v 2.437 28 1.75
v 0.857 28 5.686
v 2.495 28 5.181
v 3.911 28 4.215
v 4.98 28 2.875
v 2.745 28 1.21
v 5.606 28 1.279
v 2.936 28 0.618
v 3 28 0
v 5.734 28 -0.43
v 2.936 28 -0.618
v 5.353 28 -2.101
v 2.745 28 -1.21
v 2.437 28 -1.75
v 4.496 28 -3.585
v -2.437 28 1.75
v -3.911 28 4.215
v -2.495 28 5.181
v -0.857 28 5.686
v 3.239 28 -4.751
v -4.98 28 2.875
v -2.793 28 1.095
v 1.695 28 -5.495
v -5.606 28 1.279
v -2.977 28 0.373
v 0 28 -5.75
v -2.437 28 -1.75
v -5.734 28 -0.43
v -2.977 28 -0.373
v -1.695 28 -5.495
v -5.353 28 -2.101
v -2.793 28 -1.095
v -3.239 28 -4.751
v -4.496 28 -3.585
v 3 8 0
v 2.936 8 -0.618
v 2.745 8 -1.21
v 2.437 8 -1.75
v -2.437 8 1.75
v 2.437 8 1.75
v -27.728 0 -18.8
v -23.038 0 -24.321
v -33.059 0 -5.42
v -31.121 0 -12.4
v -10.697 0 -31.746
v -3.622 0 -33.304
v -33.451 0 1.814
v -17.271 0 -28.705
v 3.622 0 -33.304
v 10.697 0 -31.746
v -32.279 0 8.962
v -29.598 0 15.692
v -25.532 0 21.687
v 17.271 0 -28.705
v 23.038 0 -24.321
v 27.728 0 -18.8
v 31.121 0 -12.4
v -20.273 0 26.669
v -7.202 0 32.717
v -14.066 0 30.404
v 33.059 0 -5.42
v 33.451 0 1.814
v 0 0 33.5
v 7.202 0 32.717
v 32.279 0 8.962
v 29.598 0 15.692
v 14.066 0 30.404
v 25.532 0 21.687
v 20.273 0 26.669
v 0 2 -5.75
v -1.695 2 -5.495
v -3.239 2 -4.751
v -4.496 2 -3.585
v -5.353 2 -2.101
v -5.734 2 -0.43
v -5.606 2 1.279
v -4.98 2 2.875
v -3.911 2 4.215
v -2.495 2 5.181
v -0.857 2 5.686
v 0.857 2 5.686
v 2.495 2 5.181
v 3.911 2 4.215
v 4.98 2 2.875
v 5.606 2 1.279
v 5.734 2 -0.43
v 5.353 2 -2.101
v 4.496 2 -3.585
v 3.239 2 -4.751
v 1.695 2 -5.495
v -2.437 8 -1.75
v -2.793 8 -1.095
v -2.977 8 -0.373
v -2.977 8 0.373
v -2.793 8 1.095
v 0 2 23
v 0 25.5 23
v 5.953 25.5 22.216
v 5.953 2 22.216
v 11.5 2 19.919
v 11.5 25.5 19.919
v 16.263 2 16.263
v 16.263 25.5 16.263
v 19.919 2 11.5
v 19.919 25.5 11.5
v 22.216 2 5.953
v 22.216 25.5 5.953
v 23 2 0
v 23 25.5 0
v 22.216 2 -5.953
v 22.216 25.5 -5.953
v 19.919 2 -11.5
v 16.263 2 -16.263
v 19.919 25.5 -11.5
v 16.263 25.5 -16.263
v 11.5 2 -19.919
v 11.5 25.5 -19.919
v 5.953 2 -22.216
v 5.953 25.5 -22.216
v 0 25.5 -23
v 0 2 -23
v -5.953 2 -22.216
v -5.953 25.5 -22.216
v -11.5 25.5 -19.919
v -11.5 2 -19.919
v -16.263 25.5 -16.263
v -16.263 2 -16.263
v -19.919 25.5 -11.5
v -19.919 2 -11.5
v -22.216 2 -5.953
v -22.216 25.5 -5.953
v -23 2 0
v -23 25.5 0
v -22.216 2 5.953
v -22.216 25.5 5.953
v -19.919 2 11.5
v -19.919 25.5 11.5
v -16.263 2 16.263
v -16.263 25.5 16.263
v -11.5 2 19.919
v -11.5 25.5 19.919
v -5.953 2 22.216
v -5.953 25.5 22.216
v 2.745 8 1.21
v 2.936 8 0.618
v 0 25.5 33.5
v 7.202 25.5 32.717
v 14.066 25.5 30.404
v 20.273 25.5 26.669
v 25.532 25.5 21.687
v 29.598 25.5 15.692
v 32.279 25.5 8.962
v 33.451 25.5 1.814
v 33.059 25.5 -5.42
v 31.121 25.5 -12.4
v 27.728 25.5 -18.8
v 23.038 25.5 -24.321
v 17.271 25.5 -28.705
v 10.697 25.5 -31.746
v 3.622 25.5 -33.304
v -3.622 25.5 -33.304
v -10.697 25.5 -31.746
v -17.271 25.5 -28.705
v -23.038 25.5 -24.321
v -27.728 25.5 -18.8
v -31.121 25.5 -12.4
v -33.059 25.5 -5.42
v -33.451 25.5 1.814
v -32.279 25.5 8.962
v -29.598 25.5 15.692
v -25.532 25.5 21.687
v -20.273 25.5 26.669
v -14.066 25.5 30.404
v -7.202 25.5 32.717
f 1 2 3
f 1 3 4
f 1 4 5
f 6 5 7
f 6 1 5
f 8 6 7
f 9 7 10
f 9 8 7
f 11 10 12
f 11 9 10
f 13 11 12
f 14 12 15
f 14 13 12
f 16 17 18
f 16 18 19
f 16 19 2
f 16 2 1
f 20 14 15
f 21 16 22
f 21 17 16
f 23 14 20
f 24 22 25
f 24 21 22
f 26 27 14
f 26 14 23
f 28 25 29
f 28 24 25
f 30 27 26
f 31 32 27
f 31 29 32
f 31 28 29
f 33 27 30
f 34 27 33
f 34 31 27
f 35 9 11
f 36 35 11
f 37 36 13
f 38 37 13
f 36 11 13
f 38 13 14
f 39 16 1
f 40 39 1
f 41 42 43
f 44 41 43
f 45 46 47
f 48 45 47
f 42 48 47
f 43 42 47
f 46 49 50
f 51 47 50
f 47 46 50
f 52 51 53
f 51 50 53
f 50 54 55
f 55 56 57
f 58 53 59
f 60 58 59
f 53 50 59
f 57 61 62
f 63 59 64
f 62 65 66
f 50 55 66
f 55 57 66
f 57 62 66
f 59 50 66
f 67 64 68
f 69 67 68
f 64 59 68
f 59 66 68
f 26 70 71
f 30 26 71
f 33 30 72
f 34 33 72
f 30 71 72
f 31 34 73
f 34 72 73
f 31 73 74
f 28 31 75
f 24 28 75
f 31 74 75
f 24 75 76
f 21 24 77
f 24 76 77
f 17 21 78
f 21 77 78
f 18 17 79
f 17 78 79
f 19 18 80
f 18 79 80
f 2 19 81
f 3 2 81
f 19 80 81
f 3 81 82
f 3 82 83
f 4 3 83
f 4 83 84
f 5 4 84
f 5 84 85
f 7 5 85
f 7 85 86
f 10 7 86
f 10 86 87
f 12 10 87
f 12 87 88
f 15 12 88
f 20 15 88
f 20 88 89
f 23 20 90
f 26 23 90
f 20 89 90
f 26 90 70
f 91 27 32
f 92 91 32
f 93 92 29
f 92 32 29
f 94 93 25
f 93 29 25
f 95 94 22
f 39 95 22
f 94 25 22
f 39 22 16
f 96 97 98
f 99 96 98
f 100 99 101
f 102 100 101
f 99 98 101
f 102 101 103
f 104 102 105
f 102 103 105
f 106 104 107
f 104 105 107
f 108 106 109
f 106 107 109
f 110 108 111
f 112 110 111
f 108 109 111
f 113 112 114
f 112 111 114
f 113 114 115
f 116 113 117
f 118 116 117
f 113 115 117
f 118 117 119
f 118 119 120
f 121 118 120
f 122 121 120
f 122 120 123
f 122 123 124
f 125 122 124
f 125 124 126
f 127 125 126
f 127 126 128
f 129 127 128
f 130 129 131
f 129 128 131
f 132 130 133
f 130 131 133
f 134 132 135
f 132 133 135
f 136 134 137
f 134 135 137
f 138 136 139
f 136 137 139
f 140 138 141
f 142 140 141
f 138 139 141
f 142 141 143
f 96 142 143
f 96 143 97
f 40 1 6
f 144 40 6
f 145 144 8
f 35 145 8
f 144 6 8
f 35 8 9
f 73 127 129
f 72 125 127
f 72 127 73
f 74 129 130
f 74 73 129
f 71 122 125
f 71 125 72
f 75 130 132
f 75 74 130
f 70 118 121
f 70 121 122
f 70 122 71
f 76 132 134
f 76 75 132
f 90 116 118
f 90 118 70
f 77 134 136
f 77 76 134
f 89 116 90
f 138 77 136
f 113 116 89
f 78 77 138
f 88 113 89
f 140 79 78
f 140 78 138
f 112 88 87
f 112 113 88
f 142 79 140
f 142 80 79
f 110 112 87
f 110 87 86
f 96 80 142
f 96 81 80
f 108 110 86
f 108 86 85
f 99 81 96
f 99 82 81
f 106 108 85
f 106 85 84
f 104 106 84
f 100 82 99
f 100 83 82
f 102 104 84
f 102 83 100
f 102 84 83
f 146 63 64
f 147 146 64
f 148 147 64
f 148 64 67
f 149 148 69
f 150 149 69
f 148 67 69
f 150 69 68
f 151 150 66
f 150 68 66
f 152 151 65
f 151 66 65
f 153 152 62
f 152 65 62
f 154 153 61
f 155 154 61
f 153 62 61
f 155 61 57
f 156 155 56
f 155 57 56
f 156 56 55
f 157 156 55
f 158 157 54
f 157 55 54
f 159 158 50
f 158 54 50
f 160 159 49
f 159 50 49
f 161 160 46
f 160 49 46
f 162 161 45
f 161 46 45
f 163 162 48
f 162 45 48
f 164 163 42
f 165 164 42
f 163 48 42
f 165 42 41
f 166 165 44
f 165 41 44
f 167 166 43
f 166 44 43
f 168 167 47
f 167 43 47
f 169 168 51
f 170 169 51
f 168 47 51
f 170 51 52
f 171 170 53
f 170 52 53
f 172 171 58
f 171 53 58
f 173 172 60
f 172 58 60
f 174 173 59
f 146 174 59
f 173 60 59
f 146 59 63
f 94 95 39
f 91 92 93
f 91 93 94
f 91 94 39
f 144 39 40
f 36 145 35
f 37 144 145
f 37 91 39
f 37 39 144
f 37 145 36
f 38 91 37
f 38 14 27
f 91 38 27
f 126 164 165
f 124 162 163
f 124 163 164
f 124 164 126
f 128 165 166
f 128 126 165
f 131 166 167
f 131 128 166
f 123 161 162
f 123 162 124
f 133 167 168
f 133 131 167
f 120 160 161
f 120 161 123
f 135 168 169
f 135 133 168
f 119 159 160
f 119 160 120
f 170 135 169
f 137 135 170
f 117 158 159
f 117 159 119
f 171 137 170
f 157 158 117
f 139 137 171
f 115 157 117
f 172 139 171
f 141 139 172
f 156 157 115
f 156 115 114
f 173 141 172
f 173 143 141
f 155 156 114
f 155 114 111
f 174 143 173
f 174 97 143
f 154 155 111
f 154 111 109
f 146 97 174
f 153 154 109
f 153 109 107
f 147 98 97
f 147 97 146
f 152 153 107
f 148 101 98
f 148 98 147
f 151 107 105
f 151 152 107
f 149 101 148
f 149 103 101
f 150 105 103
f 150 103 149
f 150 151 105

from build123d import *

# Parameters (mm, degrees)
SKETCH_1_R          = 33.5
EXTRUDE_1_DEPTH     = 25.5
SKETCH_2_R          = 23
CUT_EXTRUDE_1_DEPTH = 23.5
SKETCH_3_R          = 5.75
EXTRUDE_2_DEPTH     = 26
CUT_EXTRUDE_2_DEPTH = 20


with BuildPart() as part:
    # Эскиз1 → Бобышка-Вытянуть1 (new body)
    with BuildSketch(Plane(origin=(0, 0, 0), x_dir=(1, 0, 0), z_dir=(0, 1, 0))):
        with Locations(Location((0, 0, 0), (0, 0, 270))):
            Circle(SKETCH_1_R)
    extrude(amount=EXTRUDE_1_DEPTH)

    # Эскиз2 → Вырез-Вытянуть1 (cut)
    with BuildSketch(Plane(origin=(0, 25.5, 0), x_dir=(1, 0, 0), z_dir=(0, 1, 0))):
        with Locations(Location((0, 0, 0), (0, 0, 270))):
            Circle(SKETCH_2_R)
    extrude(amount=-CUT_EXTRUDE_1_DEPTH, mode=Mode.SUBTRACT)

    # Эскиз3 → Бобышка-Вытянуть2 (add)
    with BuildSketch(Plane(origin=(0, 2, 0), x_dir=(1, 0, 0), z_dir=(0, 1, 0))):
        with Locations(Location((0, 0, 0), (0, 0, 90))):
            Circle(SKETCH_3_R)
    extrude(amount=EXTRUDE_2_DEPTH)

    # Эскиз4 → Вырез-Вытянуть2 (cut)
    with BuildSketch(Plane(origin=(0, 28, 0), x_dir=(1, 0, 0), z_dir=(0, 1, 0))):
        with BuildLine():
            Line((2.436698586, 1.75), (-2.436698586, 1.75))
            ThreePointArc((-2.436698586, 1.75), (-3, 0), (-2.436698586, -1.75))
            Line((-2.436698586, -1.75), (2.436698586, -1.75))
            ThreePointArc((2.436698586, -1.75), (2.855704445, -0.919212772), (3, 0))
            ThreePointArc((3, 0), (2.855704445, 0.919212772), (2.436698586, 1.75))
        make_face()
    extrude(amount=-CUT_EXTRUDE_2_DEPTH, mode=Mode.SUBTRACT)


solid = part.part
